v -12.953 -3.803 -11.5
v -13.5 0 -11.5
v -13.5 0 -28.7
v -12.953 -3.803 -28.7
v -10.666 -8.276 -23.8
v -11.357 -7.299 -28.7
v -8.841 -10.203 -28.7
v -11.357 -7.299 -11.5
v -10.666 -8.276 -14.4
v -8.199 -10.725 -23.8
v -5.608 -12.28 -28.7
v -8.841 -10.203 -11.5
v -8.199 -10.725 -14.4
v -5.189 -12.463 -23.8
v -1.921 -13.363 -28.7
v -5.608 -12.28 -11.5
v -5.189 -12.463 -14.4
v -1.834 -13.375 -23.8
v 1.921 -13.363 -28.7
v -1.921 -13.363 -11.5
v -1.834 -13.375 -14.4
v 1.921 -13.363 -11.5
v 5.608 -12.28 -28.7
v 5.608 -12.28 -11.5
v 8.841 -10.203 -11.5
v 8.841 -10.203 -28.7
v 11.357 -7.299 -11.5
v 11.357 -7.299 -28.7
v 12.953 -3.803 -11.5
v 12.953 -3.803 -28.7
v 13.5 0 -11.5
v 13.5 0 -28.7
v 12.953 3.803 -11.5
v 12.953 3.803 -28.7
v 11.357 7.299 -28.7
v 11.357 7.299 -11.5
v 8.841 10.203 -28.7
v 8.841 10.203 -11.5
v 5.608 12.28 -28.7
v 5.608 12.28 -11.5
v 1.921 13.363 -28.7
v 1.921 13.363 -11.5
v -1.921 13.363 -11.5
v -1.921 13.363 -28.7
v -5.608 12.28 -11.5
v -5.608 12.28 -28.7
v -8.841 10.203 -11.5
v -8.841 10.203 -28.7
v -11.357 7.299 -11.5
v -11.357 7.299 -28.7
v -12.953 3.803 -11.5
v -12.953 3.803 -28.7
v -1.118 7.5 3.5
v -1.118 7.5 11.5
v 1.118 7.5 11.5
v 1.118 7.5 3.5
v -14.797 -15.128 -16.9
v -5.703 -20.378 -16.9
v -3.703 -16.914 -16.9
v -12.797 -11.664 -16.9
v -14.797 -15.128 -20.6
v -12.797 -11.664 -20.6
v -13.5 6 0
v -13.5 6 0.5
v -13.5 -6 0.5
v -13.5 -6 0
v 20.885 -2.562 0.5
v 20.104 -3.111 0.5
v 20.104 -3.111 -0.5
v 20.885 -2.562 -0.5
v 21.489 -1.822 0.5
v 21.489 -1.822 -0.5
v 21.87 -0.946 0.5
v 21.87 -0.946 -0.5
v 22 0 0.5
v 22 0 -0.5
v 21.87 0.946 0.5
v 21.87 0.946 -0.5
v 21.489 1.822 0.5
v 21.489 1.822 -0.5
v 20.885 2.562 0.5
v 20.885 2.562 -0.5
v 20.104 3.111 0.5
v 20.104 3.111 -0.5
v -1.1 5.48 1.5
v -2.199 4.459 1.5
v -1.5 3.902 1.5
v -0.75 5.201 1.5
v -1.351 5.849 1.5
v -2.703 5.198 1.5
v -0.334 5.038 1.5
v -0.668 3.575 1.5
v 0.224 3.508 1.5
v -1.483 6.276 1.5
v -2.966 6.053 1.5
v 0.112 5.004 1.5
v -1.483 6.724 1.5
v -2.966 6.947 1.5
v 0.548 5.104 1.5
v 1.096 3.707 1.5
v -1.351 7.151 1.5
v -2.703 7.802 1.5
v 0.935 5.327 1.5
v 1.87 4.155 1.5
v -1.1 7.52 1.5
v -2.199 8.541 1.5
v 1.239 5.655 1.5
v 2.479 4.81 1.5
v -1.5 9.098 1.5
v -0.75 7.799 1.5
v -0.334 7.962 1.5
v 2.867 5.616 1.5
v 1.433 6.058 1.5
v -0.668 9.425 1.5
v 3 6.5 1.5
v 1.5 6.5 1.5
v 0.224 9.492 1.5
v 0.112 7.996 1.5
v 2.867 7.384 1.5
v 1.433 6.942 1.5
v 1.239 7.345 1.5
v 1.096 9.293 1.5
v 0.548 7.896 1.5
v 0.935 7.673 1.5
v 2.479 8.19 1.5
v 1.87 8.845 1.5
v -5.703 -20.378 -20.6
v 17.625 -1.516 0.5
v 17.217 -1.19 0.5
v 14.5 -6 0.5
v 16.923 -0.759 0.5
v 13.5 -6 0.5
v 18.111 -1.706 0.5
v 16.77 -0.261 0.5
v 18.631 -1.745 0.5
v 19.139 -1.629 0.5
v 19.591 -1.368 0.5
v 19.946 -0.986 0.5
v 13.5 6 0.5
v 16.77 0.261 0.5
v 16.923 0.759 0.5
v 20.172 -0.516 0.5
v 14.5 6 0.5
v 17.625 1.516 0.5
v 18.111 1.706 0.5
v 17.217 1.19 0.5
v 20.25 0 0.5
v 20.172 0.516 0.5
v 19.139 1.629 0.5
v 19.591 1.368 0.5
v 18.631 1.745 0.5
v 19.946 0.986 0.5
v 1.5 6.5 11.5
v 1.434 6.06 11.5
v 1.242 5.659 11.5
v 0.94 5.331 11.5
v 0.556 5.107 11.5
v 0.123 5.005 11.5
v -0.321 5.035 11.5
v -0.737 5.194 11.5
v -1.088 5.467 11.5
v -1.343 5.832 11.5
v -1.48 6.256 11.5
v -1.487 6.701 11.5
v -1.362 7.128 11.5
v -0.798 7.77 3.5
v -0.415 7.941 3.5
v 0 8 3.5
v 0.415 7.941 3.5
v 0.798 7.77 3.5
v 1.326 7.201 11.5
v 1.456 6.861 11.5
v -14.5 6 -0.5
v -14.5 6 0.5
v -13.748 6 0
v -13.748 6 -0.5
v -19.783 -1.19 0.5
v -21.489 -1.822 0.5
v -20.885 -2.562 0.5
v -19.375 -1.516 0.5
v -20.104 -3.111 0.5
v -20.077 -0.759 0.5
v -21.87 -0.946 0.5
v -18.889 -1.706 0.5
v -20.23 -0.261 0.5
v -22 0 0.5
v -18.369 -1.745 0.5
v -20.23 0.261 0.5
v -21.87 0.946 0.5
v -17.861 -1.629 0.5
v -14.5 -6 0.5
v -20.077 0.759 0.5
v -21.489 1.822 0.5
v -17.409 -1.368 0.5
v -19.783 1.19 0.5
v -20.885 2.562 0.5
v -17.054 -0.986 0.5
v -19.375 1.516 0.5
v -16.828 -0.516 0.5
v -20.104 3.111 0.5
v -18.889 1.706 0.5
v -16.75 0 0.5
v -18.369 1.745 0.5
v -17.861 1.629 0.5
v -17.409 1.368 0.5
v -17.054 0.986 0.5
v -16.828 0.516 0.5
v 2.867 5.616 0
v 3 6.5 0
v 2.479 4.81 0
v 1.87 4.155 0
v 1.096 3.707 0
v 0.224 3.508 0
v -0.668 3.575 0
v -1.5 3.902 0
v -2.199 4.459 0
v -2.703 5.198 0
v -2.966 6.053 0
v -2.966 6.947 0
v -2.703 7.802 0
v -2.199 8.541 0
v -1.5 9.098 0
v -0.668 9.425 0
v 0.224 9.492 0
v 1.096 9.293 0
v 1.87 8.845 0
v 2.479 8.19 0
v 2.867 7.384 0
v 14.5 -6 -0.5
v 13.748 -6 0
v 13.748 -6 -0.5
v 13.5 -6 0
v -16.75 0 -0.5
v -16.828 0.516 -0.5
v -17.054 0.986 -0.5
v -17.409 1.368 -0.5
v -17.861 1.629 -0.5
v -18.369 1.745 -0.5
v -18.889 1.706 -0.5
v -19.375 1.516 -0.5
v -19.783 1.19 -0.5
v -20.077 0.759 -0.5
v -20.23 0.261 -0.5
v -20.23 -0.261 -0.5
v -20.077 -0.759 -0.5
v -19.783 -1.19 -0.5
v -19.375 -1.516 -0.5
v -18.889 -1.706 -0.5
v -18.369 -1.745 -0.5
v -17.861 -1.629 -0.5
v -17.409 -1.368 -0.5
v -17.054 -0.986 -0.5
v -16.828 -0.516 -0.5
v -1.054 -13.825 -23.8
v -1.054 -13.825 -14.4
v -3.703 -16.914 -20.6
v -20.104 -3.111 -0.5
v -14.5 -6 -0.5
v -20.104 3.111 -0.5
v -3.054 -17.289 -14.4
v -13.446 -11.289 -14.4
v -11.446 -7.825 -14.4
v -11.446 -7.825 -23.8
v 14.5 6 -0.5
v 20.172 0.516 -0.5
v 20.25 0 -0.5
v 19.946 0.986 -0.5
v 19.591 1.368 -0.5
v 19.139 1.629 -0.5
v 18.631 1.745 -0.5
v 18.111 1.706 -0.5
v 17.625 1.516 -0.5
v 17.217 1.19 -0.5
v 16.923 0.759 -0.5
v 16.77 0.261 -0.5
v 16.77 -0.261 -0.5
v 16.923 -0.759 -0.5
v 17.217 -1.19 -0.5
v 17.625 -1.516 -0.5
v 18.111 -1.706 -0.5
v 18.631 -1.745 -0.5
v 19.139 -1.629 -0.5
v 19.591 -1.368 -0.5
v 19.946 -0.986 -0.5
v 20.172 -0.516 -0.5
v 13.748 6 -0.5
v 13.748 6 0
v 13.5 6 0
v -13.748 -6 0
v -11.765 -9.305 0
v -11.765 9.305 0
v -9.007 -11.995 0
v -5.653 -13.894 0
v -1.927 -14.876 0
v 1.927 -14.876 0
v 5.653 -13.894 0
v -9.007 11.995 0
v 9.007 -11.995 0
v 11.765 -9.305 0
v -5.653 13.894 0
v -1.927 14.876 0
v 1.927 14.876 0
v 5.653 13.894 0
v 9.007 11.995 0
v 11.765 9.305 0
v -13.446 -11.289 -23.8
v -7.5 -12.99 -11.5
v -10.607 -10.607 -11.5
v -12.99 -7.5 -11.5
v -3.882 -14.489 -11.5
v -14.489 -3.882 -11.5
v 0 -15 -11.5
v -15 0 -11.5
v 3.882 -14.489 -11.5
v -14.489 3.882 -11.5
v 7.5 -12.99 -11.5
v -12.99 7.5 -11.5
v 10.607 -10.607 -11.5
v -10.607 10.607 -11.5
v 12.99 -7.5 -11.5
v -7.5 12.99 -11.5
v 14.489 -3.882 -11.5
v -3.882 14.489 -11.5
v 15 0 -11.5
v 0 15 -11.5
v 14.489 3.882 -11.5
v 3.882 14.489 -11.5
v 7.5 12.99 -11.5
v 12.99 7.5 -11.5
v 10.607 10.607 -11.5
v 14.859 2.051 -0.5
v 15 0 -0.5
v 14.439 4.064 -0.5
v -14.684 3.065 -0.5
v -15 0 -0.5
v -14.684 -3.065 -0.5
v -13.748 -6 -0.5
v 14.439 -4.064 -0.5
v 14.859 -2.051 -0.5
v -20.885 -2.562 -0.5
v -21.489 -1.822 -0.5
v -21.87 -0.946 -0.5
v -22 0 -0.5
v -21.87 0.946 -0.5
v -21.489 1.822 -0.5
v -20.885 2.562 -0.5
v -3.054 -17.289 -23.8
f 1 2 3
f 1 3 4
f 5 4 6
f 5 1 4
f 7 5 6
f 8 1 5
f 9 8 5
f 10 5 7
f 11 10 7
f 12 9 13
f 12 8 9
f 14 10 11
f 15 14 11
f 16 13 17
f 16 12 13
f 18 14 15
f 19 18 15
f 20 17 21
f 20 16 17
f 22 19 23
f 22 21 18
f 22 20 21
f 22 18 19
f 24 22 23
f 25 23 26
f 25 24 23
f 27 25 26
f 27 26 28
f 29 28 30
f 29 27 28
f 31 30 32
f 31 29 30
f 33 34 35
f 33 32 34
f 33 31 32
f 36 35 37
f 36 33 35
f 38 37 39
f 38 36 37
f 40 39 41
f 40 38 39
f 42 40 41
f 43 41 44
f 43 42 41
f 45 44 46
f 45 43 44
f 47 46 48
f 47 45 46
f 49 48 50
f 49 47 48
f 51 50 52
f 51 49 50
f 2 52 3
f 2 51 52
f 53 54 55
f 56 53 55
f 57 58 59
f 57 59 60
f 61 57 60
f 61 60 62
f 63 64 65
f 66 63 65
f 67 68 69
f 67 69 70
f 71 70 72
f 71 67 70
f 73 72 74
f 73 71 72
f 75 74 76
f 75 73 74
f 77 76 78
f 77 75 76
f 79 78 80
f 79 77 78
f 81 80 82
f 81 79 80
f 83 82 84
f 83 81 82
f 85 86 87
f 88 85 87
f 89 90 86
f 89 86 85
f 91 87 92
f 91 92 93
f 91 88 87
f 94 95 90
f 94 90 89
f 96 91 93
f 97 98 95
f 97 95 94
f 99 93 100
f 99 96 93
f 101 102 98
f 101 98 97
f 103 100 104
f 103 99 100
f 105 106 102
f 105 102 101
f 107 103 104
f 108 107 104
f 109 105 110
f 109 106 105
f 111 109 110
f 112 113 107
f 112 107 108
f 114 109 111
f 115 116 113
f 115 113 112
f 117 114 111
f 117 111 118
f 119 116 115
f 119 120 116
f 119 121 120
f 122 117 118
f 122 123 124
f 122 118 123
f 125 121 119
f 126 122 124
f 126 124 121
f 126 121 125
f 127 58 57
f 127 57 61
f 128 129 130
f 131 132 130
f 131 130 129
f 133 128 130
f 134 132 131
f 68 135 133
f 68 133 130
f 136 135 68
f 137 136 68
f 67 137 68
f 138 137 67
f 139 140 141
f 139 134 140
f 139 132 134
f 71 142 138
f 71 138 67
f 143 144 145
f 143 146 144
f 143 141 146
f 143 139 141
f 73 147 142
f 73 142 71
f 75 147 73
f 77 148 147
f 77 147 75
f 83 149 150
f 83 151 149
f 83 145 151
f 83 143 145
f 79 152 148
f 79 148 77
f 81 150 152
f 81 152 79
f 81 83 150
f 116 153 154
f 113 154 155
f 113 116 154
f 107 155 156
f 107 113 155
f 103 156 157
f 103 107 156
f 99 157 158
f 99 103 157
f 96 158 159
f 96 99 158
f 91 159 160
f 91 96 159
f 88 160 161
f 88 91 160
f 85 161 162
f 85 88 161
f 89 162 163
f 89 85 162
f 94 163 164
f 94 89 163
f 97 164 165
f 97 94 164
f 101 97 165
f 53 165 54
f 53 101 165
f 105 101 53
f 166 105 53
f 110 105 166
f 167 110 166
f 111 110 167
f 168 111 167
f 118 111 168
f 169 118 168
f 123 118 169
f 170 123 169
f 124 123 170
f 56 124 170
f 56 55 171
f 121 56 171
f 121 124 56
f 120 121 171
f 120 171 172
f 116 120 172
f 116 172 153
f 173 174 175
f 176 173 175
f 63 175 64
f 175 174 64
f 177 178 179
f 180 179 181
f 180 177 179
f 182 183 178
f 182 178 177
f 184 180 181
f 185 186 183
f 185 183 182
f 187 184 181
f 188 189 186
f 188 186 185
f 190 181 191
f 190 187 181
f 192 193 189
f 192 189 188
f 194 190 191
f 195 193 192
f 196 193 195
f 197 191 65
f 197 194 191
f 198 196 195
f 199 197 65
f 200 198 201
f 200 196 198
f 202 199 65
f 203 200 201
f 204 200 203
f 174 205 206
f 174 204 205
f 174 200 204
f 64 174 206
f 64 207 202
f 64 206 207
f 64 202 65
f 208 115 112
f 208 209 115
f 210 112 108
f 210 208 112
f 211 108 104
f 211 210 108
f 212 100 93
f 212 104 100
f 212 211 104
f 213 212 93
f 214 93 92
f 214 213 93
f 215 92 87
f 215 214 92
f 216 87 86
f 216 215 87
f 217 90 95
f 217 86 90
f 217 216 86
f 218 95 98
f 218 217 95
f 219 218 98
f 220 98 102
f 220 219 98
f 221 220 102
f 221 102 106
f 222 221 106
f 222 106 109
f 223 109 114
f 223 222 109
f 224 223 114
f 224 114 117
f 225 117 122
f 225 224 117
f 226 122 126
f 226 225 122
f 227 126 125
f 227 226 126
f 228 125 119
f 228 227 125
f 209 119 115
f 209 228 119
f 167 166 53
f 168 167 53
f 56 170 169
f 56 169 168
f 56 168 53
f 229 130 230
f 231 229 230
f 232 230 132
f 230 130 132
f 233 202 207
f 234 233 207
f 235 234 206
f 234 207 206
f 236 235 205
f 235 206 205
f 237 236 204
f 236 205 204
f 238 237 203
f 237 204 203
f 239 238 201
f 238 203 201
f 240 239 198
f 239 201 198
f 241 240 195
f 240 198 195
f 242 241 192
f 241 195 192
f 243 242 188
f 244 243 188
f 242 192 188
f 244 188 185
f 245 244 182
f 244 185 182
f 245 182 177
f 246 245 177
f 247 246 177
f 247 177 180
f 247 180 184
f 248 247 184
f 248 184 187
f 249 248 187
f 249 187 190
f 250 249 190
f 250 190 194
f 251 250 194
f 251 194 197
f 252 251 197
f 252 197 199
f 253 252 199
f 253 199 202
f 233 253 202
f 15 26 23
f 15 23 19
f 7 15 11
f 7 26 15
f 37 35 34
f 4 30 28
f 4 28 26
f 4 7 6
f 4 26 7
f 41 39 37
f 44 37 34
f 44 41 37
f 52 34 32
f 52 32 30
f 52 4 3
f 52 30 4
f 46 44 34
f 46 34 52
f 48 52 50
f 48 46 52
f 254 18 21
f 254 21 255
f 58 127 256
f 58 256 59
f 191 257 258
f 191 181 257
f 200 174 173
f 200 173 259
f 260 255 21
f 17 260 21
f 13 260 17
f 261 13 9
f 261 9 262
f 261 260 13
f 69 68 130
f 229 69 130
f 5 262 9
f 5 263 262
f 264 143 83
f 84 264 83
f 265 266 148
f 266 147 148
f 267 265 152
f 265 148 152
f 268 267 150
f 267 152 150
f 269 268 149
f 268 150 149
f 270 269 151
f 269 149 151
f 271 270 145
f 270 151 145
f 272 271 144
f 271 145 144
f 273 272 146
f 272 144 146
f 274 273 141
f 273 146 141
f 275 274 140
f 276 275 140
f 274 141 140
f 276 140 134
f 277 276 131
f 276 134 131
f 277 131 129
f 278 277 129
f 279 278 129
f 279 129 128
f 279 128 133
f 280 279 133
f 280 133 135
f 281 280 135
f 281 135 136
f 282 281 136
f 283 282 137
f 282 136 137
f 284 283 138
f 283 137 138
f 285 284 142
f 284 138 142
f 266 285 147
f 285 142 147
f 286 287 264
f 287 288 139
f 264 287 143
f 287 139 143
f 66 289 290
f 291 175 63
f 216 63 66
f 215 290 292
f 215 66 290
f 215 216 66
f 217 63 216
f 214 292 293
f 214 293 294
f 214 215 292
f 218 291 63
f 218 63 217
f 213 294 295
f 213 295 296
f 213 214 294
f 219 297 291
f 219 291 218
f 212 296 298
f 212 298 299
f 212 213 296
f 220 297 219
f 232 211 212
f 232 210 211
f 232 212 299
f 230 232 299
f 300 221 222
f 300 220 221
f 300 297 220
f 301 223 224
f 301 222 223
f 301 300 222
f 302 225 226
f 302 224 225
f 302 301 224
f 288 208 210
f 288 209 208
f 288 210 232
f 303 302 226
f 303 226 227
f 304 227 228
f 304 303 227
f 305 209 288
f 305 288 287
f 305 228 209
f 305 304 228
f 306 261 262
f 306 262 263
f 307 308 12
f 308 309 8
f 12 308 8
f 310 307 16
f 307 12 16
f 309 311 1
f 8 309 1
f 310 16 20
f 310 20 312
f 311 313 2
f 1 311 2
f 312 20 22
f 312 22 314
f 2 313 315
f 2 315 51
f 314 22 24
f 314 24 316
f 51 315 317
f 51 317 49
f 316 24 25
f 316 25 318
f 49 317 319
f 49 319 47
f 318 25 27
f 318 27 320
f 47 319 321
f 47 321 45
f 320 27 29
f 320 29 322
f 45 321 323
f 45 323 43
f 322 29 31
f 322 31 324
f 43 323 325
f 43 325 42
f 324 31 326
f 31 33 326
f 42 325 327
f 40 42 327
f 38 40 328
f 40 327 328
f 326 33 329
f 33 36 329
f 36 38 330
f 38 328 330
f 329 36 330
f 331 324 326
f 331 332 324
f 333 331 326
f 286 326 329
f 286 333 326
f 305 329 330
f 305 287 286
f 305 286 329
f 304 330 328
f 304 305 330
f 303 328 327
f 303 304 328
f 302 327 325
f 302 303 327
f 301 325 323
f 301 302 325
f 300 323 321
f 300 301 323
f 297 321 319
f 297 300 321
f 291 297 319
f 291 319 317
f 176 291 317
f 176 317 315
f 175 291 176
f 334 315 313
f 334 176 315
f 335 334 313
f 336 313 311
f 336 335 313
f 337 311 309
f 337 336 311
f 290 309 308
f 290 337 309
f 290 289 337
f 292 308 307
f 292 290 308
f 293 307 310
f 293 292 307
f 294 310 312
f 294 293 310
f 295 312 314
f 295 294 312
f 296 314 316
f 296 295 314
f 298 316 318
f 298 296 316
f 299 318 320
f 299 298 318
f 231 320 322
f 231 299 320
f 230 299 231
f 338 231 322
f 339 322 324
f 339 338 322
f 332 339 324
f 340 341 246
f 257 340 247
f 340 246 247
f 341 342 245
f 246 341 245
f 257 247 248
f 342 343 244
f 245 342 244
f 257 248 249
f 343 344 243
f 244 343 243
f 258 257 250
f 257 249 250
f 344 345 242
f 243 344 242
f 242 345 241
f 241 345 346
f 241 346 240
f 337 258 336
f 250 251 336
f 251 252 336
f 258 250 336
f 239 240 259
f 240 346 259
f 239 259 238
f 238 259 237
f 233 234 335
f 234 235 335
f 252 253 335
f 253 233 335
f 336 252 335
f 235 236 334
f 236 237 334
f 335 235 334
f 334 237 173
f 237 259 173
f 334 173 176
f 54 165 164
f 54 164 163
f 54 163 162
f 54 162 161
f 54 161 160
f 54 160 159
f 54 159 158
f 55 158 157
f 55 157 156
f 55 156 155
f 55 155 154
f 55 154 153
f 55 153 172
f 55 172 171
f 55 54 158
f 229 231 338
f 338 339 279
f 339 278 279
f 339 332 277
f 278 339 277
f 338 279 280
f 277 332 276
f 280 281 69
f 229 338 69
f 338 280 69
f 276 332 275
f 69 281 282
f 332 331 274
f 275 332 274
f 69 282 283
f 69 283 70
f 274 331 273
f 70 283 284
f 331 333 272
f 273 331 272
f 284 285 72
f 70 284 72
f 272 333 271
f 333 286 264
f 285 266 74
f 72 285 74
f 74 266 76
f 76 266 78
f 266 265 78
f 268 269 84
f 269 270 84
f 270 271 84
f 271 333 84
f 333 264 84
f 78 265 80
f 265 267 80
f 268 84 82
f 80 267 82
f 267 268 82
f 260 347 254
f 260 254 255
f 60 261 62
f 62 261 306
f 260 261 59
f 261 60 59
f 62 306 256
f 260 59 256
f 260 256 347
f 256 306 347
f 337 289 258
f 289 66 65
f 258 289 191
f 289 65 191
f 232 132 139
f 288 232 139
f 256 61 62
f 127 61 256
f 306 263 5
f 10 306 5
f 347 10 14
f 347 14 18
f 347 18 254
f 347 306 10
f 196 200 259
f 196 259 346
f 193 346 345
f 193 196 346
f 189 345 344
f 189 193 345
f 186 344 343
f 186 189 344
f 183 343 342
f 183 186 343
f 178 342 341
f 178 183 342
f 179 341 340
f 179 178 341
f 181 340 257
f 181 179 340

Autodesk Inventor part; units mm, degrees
ref_plane "YZ Plane" through (0, 0, 0) normal (1, 0, 0) x (0, 1, 0)
sketch "スケッチ1" plane through (0, 0, 0) normal (0, 0, 1) x (1, 0, 0)
  circle A0 centre (0, 0) radius 15
  dimension "d0" = 30
extrude "押し出し1" add sketch "スケッチ1" against normal blind 11.5
sketch "スケッチ2" plane through (0, 0, 0) normal (0, 0, 1) x (1, 0, 0)
  circle A0 centre (0, 6.5) radius 3
  point P0 (0, 0)
  dimension "d3" = 6
  dimension "d4" = 6.5
extrude "押し出し2" add sketch "スケッチ2" along normal blind 1.5
sketch "スケッチ3" plane through (0, 6.5, 1.5) normal (0, 0, 1) x (1, 0, 0)
  circle A0 centre (0, 0) radius 3 projected
  circle A1 centre (0, 0) radius 1.5
  point P0 (0, -6.5)
  dimension "d7" = 3
extrude "押し出し3" add sketch "スケッチ3" along normal blind 10 contours A1
sketch "スケッチ4" plane through (0, 0, -11.5) normal (0, 0, -1) x (-1, 0, 0)
  circle A0 centre (0, 0) radius 13.5
  dimension "d10" = 27
extrude "押し出し4" add sketch "スケッチ4" along normal blind 17.2
sketch "スケッチ6" plane through (0, 6.5, 11.5) normal (0, 0, 1) x (1, 0, 0)
  circle A0 centre (0, 0) radius 1.5 projected
  line L0 (-1.118, 1) -> (1.118, 1)
  point P0 (0, -6.5)
  dimension "d21" = 1
extrude "押し出し6" cut sketch "スケッチ6" against normal blind 8 contours L0 A0 picked at (-0.0599, 1.1631)
ref_plane "作業平面1" through (0, 0, 0.5) normal (0, 0, 1) x (1, 0, 0)
sketch "スケッチ7" plane through (0, 0, 0.5) normal (0, 0, 1) x (1, 0, 0)
  line L0 (0, 21.4774) -> (0, -21.4774) construction
  line L1 (-14.5, 6) -> (-13.5, 6)
  line L2 (-13.5, 6) -> (-13.5, -6)
  line L3 (-13.5, -6) -> (-14.5, -6)
  line L4 (-14.5, -6) -> (-14.5, 6)
  line L5 (13.5, 6) -> (14.5, 6)
  line L6 (14.5, 6) -> (14.5, -6)
  line L7 (14.5, -6) -> (13.5, -6)
  line L8 (13.5, -6) -> (13.5, 6)
  circle A0 centre (-18.5, 0) radius 1.75
  circle A1 centre (18.5, 0) radius 1.75
  circle A2 centre (-18.5, 0) radius 3.5
  circle A3 centre (18.5, 0) radius 3.5
  line L9 (-14.5, 6) -> (-20.1038, 3.1109)
  line L10 (-20.1038, -3.1109) -> (-14.5, -6)
  line L11 (14.5, 6) -> (20.1038, 3.1109)
  line L12 (20.1038, -3.1109) -> (14.5, -6)
  point P0 (0, 0)
  point P1 (0, 0)
  point P2 (-13.5, 0)
  point P3 (13.5, 0)
  dimension "d25" = 1
  dimension "d26" = 12
  dimension "d27" = 29
  dimension "d28" = 3.5
  dimension "d29" = 37
  dimension "d30" = 7
extrude "押し出し7" add sketch "スケッチ7" against normal blind 1
ref_plane "作業平面3" through (-10.25, -17.7535, -28.7) normal (-0.5, -0.866, 0) x (0, 0, -1)
ref_plane "作業平面2" through (0, 0, -28.7) normal (-0.5, -0.866, 0) x (0, 0, -1)
sketch "スケッチ9" plane through (-10.25, -17.7535, -28.7) normal (-0.5, -0.866, 0) x (0, 0, -1)
  line L0 (-11.8, -5.25) -> (-8.1, -5.25)
  line L1 (-8.1, -5.25) -> (-8.1, 5.25)
  line L2 (-8.1, 5.25) -> (-11.8, 5.25)
  line L3 (-11.8, 5.25) -> (-11.8, -5.25)
  line L4 (-29.2, -15.855) -> (-29.2, -9.5574) projected
  point P0 (-28.7, 0)
  point P1 (-11.8, 0)
  dimension "d35" = 3.7
  dimension "d36" = 10.5
  dimension "d37" = 17.4
extrude "押し出し8" add sketch "スケッチ9" against normal blind 4
sketch "スケッチ10" plane through (-8.25, -14.2894, -28.7) normal (0.5, 0.866, 0) x (0.866, -0.5, 0)
  line L0 (-6, -4.9) -> (6, -4.9)
  line L1 (6, -4.9) -> (6, -14.3)
  line L2 (6, -14.3) -> (-6, -14.3)
  line L3 (-6, -14.3) -> (-6, -4.9)
  line L4 (-15.855, -29.2) -> (-9.5574, -29.2) projected
  point P0 (0, -28.7)
  point P1 (0, -14.3)
  dimension "d40" = 12
  dimension "d41" = 9.4
  dimension "d42" = 14.9
extrude "押し出し9" add sketch "スケッチ10" along normal blind 4
properties part number "SPG27"
